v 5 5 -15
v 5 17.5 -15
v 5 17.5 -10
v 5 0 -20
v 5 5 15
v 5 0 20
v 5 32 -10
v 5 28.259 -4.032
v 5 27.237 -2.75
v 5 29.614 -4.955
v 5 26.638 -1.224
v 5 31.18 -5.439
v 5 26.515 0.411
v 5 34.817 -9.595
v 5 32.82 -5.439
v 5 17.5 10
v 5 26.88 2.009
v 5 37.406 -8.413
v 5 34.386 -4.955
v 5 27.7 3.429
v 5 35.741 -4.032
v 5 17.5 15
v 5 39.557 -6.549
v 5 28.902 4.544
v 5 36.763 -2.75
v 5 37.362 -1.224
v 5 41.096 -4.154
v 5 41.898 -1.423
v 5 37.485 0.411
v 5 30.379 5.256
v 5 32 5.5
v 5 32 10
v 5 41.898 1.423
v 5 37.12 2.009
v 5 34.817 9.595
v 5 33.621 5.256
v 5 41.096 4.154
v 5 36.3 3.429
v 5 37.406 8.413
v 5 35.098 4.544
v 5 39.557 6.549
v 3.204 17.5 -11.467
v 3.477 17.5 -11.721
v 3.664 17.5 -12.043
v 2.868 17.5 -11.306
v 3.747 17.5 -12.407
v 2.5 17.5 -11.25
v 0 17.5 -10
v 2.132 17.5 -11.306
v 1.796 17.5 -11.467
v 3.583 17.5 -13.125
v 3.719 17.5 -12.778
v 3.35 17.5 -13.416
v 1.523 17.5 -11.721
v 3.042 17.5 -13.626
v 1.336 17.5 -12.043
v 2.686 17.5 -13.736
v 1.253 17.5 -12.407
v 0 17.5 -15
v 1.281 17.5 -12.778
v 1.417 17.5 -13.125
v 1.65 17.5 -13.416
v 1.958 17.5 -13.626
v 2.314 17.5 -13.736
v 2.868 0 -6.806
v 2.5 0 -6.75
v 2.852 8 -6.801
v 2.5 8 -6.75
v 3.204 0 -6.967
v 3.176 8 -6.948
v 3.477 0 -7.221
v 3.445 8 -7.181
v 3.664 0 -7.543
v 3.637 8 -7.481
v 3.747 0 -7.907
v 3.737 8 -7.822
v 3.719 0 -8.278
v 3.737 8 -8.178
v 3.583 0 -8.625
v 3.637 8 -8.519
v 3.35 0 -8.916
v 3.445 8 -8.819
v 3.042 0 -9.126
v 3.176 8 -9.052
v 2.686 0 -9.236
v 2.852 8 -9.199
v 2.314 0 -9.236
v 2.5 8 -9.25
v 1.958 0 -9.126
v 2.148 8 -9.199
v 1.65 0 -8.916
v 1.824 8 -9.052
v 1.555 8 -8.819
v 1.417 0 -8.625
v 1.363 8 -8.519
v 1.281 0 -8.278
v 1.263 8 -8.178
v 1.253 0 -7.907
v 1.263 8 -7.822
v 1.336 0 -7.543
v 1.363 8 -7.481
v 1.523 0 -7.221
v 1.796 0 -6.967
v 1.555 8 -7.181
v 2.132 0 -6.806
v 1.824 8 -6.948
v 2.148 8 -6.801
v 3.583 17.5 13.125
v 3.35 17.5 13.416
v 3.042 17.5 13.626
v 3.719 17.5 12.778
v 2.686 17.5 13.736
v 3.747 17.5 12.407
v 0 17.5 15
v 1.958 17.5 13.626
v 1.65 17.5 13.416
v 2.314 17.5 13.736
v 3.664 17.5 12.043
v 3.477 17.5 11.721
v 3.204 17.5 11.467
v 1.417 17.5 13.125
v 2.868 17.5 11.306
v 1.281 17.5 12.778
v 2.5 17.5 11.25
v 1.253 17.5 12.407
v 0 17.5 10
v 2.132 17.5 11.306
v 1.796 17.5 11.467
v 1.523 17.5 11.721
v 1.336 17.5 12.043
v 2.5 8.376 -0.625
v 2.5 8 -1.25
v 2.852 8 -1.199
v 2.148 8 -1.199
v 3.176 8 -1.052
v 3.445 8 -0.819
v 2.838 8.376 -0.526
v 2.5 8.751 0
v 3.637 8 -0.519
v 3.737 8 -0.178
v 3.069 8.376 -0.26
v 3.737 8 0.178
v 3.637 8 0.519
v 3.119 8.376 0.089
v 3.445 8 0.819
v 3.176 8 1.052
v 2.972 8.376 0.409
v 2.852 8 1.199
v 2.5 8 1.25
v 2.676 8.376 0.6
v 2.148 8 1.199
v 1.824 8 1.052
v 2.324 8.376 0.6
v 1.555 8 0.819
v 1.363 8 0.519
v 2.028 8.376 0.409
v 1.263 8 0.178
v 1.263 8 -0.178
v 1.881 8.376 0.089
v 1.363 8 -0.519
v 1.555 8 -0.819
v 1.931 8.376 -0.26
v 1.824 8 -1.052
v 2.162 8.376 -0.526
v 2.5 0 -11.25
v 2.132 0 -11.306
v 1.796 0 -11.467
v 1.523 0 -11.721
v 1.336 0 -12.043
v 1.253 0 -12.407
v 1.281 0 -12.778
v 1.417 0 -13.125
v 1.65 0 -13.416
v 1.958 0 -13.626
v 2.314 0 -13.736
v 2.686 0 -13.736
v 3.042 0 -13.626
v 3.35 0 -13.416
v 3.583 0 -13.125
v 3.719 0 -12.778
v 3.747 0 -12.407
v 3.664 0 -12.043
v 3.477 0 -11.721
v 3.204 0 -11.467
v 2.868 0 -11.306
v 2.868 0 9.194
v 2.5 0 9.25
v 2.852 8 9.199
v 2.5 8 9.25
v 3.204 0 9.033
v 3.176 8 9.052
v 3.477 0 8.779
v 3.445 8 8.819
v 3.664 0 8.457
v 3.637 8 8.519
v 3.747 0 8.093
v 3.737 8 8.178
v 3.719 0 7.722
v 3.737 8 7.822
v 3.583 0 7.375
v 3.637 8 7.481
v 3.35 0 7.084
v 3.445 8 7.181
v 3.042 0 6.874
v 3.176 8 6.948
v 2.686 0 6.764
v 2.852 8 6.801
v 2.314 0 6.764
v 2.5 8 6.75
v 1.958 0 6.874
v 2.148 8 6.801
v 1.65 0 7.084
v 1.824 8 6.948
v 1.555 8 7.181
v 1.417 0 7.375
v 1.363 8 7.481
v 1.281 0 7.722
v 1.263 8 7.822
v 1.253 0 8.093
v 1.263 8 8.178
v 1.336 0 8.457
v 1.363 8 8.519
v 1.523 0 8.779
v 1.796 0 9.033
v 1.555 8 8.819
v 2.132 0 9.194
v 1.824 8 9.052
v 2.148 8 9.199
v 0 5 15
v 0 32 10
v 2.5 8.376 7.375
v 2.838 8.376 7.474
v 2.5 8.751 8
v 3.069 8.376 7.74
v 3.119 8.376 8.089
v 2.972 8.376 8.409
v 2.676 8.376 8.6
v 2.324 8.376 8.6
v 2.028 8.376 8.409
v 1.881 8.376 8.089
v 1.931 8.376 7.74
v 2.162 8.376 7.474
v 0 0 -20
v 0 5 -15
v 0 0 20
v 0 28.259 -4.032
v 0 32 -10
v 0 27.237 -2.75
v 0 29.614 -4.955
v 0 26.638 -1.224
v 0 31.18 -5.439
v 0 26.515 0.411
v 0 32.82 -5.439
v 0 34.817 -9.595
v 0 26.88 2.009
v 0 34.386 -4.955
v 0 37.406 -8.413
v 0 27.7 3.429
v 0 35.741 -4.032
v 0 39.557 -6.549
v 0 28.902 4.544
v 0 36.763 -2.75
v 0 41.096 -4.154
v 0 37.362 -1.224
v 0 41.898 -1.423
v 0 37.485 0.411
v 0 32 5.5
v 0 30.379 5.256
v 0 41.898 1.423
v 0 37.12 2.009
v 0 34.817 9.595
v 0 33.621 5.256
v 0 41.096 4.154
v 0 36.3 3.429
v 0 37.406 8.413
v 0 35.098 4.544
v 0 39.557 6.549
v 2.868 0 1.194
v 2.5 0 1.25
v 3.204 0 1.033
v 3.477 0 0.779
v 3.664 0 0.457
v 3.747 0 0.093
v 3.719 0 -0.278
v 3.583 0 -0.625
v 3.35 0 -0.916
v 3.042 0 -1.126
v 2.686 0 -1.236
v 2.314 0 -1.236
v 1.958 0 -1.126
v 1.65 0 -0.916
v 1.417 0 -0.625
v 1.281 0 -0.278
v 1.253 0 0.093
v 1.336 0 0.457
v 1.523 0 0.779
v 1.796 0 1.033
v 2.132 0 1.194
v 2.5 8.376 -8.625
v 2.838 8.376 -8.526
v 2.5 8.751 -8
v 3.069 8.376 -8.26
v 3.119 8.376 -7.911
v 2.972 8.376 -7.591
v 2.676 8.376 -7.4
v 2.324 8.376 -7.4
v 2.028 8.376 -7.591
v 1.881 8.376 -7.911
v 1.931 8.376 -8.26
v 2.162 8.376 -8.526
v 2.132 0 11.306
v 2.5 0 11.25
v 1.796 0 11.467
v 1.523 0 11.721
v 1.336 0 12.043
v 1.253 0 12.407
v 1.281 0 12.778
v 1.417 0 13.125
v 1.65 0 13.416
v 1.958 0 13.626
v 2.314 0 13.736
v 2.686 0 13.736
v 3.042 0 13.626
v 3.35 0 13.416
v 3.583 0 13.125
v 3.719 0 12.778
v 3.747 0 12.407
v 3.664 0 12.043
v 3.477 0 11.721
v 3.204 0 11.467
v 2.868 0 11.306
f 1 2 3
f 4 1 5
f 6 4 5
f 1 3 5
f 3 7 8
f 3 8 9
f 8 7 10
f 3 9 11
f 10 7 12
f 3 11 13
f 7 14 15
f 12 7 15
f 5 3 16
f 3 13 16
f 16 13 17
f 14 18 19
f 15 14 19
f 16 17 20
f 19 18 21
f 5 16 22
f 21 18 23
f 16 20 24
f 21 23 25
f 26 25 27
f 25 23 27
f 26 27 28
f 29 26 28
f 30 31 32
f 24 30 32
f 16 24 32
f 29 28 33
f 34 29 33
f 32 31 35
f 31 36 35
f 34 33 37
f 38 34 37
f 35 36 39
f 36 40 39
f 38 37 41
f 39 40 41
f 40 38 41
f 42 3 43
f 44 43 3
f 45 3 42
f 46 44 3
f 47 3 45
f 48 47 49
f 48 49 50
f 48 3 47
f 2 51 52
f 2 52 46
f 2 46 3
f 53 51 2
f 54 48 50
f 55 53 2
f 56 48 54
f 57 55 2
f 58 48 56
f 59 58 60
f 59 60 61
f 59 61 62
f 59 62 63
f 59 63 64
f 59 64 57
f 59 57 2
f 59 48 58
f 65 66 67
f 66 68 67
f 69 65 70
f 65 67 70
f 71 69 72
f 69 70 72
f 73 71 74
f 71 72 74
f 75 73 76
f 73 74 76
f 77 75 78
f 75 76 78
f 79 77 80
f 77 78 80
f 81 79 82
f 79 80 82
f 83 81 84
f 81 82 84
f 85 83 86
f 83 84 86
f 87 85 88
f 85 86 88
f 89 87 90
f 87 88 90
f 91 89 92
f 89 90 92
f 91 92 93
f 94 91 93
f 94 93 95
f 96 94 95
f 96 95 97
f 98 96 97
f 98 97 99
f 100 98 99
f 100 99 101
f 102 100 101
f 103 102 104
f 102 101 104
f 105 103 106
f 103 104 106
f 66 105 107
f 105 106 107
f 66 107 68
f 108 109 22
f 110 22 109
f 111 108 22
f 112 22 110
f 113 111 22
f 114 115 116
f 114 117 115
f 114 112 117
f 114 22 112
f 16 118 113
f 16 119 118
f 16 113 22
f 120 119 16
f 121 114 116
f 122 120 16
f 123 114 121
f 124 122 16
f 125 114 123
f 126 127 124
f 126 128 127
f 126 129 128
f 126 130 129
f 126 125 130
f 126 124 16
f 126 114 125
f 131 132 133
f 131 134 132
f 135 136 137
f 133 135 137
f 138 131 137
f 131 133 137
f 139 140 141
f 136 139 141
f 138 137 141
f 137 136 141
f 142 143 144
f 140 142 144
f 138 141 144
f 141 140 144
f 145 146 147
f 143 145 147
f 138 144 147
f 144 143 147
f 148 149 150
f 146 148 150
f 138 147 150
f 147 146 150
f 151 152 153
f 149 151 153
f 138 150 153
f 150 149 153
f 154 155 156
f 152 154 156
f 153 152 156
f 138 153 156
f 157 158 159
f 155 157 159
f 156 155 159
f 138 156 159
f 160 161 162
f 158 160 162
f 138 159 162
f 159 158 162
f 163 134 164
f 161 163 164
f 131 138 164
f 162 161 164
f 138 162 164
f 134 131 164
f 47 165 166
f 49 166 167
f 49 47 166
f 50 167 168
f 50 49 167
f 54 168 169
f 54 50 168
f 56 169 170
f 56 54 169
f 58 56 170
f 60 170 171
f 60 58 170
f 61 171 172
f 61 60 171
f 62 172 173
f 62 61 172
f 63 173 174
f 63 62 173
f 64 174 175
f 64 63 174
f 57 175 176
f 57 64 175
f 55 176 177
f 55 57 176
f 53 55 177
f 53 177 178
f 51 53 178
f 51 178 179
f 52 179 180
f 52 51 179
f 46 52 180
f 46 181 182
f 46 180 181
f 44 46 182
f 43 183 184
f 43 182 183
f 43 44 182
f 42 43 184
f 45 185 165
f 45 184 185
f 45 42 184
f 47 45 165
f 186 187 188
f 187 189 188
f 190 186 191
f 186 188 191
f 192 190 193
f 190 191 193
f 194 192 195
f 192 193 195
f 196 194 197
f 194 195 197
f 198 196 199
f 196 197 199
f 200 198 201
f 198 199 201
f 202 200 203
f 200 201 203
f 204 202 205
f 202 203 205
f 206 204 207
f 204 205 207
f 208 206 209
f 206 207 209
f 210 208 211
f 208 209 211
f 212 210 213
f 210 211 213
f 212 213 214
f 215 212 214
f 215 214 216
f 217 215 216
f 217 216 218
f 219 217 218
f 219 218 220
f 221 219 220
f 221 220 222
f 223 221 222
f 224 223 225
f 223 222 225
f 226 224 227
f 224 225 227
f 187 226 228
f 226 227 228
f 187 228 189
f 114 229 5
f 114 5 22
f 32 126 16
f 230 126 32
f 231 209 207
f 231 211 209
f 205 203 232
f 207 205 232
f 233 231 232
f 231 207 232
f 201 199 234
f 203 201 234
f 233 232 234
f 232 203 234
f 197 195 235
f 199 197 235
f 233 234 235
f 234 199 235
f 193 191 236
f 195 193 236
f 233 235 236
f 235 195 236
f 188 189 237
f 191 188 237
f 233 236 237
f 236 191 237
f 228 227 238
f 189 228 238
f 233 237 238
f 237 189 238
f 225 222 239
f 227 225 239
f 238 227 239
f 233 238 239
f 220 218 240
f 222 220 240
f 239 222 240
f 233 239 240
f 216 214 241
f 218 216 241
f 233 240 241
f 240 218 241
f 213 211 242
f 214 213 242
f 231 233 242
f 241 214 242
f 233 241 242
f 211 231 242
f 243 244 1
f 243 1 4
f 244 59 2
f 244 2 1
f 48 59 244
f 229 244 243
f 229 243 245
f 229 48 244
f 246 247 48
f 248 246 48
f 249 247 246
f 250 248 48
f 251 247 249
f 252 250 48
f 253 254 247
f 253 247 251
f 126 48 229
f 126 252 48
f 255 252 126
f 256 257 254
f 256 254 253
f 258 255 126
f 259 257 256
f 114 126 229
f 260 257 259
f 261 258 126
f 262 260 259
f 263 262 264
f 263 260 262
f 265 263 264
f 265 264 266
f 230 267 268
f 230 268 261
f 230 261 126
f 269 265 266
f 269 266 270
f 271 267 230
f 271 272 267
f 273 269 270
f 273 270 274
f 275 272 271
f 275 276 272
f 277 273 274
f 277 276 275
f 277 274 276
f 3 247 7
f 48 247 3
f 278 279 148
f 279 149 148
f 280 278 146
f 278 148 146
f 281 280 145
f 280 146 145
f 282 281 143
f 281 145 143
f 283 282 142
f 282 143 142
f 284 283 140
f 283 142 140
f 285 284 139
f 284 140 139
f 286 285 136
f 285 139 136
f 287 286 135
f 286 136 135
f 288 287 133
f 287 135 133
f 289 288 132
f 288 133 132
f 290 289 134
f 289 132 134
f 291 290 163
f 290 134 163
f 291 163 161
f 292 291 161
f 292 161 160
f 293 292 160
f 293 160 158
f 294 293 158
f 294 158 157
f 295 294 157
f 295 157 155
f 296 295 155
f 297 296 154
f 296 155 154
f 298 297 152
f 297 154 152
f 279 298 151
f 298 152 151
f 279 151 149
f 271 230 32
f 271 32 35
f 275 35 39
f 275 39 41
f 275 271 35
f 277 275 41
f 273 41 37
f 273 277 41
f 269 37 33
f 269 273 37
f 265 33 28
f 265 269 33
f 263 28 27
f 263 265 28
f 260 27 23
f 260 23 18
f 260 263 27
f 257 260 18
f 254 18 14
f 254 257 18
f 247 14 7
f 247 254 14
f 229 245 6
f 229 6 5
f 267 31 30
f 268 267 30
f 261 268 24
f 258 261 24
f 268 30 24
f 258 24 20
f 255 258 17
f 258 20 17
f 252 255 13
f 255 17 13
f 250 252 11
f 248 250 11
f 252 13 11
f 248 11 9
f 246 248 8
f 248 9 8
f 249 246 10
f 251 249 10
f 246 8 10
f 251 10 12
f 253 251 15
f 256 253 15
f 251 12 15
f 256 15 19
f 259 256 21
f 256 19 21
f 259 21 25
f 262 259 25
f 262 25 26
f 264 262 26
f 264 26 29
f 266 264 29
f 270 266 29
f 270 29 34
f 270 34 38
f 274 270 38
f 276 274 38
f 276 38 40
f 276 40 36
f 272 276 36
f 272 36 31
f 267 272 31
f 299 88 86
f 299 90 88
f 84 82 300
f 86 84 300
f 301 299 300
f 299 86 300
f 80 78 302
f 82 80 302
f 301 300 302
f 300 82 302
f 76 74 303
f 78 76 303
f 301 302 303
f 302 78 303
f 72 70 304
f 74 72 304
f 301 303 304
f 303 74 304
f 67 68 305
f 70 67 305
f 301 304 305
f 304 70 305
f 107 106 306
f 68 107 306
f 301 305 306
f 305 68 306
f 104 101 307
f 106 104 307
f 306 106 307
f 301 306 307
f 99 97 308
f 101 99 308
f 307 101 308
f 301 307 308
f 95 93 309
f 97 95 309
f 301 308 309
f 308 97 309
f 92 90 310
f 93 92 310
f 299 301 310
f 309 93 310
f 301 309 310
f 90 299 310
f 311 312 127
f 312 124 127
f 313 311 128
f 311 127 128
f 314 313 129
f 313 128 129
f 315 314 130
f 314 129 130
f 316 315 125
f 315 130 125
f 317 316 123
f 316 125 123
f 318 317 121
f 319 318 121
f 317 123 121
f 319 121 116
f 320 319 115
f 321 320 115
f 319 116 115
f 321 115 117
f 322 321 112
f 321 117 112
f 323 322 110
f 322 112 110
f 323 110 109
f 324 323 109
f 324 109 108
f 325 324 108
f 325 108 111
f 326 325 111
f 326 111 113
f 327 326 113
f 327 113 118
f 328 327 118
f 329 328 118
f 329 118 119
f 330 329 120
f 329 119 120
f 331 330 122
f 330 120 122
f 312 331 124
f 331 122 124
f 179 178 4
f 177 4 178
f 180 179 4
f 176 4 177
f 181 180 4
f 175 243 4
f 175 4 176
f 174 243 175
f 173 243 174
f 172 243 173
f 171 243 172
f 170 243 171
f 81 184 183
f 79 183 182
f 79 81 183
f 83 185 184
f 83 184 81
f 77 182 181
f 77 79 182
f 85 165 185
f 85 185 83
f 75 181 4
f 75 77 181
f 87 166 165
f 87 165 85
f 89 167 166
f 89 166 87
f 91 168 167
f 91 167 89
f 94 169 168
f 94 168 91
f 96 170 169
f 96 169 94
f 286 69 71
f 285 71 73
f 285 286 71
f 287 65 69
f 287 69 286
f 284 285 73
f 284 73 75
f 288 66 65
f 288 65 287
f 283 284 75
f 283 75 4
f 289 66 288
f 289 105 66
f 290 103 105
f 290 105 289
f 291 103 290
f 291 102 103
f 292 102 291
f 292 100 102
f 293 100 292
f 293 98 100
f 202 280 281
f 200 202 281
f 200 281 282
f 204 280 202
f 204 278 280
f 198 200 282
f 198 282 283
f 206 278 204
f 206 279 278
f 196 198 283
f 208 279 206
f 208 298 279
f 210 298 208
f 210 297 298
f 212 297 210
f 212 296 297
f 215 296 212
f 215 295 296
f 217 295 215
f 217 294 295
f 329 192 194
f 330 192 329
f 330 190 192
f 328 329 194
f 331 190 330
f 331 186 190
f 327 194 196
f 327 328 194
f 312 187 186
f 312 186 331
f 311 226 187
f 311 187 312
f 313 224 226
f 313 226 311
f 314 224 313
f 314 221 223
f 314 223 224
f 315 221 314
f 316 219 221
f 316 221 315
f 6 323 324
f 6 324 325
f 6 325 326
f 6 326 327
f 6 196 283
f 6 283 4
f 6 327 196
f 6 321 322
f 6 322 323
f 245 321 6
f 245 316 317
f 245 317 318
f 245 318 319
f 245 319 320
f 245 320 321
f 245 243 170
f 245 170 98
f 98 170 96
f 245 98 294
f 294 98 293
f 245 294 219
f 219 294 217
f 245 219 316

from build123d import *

# Parameters (mm, degrees)
BOSS_EXTRUDE1_DEPTH            = 5
F_11_0_11_DIAMETER_HOLE1_D     = 11
F_11_0_11_DIAMETER_HOLE1_DEPTH = 25
F_11_0_11_DIAMETER_HOLE1_TIP   = 3.304733405
M3_TAPPED_HOLE3_D              = 2.5
M3_TAPPED_HOLE3_DEPTH          = 8
M3_TAPPED_HOLE3_TIP            = 0.751075774


with BuildPart() as part:
    # Sketch1 → Boss-Extrude1 (new body)
    with BuildSketch(Plane(origin=(0, 0, 0), x_dir=(0, 0, -1), z_dir=(1, 0, 0))):
        with BuildLine():
            Line((10, 0), (-10, 0))
            Line((-10, 0), (-20, 0))
            Line((-20, 0), (-15, 5))
            Line((-15, 5), (-15, 10))
            Line((-15, 10), (-15, 17.5))
            Line((-15, 17.5), (-10, 17.5))
            Line((-10, 17.5), (-10, 32))
            ThreePointArc((-10, 32), (0, 42), (10, 32))
            Line((10, 32), (10, 17.5))
            Line((10, 17.5), (15, 17.5))
            Line((15, 17.5), (15, 10))
            Line((15, 10), (15, 5))
            Line((15, 5), (20, 0))
            Line((20, 0), (10, 0))
        make_face()
    extrude(amount=BOSS_EXTRUDE1_DEPTH)

    # Ø11.0 (11) Diameter Hole1
    with Locations(Plane(origin=(0, 32, 0), x_dir=(0, 0, -1), z_dir=(-1, 0, 0))):
        with Locations((0, 0)):
            Hole(F_11_0_11_DIAMETER_HOLE1_D / 2, depth=F_11_0_11_DIAMETER_HOLE1_DEPTH)
            with Locations((0, 0, -(F_11_0_11_DIAMETER_HOLE1_DEPTH + F_11_0_11_DIAMETER_HOLE1_TIP / 2))):  # 118° drill point
                Cone(0, F_11_0_11_DIAMETER_HOLE1_D / 2, F_11_0_11_DIAMETER_HOLE1_TIP, mode=Mode.SUBTRACT)

    # Sketch9 → M3 Tapped Hole2 (revolve, cut)
    with BuildSketch(Plane(origin=(2.5, 17.5, -12.5), x_dir=(0, 0, 1), z_dir=(1, 0, 0))):
        Polygon((0, 0), (0, 18.751075774), (1.25, 18), (1.25, 0), align=None)
    m3_tapped_hole2 = revolve(axis=Axis((2.5, 23.85, -12.5), (0, -1, 0)), mode=Mode.SUBTRACT)

    # Mirror1: M3 Tapped Hole2 across plane
    add(m3_tapped_hole2.mirror(Plane.XY), mode=Mode.SUBTRACT)

    # M3 Tapped Hole3
    with Locations(Plane(origin=(2.5, 0, 8), x_dir=(0, 0, -1), z_dir=(0, -1, 0))):
        with Locations((0, 0), (8, 0), (16, 0)):
            Hole(M3_TAPPED_HOLE3_D / 2, depth=M3_TAPPED_HOLE3_DEPTH)
            with Locations((0, 0, -(M3_TAPPED_HOLE3_DEPTH + M3_TAPPED_HOLE3_TIP / 2))):  # 118° drill point
                Cone(0, M3_TAPPED_HOLE3_D / 2, M3_TAPPED_HOLE3_TIP, mode=Mode.SUBTRACT)


solid = part.part
